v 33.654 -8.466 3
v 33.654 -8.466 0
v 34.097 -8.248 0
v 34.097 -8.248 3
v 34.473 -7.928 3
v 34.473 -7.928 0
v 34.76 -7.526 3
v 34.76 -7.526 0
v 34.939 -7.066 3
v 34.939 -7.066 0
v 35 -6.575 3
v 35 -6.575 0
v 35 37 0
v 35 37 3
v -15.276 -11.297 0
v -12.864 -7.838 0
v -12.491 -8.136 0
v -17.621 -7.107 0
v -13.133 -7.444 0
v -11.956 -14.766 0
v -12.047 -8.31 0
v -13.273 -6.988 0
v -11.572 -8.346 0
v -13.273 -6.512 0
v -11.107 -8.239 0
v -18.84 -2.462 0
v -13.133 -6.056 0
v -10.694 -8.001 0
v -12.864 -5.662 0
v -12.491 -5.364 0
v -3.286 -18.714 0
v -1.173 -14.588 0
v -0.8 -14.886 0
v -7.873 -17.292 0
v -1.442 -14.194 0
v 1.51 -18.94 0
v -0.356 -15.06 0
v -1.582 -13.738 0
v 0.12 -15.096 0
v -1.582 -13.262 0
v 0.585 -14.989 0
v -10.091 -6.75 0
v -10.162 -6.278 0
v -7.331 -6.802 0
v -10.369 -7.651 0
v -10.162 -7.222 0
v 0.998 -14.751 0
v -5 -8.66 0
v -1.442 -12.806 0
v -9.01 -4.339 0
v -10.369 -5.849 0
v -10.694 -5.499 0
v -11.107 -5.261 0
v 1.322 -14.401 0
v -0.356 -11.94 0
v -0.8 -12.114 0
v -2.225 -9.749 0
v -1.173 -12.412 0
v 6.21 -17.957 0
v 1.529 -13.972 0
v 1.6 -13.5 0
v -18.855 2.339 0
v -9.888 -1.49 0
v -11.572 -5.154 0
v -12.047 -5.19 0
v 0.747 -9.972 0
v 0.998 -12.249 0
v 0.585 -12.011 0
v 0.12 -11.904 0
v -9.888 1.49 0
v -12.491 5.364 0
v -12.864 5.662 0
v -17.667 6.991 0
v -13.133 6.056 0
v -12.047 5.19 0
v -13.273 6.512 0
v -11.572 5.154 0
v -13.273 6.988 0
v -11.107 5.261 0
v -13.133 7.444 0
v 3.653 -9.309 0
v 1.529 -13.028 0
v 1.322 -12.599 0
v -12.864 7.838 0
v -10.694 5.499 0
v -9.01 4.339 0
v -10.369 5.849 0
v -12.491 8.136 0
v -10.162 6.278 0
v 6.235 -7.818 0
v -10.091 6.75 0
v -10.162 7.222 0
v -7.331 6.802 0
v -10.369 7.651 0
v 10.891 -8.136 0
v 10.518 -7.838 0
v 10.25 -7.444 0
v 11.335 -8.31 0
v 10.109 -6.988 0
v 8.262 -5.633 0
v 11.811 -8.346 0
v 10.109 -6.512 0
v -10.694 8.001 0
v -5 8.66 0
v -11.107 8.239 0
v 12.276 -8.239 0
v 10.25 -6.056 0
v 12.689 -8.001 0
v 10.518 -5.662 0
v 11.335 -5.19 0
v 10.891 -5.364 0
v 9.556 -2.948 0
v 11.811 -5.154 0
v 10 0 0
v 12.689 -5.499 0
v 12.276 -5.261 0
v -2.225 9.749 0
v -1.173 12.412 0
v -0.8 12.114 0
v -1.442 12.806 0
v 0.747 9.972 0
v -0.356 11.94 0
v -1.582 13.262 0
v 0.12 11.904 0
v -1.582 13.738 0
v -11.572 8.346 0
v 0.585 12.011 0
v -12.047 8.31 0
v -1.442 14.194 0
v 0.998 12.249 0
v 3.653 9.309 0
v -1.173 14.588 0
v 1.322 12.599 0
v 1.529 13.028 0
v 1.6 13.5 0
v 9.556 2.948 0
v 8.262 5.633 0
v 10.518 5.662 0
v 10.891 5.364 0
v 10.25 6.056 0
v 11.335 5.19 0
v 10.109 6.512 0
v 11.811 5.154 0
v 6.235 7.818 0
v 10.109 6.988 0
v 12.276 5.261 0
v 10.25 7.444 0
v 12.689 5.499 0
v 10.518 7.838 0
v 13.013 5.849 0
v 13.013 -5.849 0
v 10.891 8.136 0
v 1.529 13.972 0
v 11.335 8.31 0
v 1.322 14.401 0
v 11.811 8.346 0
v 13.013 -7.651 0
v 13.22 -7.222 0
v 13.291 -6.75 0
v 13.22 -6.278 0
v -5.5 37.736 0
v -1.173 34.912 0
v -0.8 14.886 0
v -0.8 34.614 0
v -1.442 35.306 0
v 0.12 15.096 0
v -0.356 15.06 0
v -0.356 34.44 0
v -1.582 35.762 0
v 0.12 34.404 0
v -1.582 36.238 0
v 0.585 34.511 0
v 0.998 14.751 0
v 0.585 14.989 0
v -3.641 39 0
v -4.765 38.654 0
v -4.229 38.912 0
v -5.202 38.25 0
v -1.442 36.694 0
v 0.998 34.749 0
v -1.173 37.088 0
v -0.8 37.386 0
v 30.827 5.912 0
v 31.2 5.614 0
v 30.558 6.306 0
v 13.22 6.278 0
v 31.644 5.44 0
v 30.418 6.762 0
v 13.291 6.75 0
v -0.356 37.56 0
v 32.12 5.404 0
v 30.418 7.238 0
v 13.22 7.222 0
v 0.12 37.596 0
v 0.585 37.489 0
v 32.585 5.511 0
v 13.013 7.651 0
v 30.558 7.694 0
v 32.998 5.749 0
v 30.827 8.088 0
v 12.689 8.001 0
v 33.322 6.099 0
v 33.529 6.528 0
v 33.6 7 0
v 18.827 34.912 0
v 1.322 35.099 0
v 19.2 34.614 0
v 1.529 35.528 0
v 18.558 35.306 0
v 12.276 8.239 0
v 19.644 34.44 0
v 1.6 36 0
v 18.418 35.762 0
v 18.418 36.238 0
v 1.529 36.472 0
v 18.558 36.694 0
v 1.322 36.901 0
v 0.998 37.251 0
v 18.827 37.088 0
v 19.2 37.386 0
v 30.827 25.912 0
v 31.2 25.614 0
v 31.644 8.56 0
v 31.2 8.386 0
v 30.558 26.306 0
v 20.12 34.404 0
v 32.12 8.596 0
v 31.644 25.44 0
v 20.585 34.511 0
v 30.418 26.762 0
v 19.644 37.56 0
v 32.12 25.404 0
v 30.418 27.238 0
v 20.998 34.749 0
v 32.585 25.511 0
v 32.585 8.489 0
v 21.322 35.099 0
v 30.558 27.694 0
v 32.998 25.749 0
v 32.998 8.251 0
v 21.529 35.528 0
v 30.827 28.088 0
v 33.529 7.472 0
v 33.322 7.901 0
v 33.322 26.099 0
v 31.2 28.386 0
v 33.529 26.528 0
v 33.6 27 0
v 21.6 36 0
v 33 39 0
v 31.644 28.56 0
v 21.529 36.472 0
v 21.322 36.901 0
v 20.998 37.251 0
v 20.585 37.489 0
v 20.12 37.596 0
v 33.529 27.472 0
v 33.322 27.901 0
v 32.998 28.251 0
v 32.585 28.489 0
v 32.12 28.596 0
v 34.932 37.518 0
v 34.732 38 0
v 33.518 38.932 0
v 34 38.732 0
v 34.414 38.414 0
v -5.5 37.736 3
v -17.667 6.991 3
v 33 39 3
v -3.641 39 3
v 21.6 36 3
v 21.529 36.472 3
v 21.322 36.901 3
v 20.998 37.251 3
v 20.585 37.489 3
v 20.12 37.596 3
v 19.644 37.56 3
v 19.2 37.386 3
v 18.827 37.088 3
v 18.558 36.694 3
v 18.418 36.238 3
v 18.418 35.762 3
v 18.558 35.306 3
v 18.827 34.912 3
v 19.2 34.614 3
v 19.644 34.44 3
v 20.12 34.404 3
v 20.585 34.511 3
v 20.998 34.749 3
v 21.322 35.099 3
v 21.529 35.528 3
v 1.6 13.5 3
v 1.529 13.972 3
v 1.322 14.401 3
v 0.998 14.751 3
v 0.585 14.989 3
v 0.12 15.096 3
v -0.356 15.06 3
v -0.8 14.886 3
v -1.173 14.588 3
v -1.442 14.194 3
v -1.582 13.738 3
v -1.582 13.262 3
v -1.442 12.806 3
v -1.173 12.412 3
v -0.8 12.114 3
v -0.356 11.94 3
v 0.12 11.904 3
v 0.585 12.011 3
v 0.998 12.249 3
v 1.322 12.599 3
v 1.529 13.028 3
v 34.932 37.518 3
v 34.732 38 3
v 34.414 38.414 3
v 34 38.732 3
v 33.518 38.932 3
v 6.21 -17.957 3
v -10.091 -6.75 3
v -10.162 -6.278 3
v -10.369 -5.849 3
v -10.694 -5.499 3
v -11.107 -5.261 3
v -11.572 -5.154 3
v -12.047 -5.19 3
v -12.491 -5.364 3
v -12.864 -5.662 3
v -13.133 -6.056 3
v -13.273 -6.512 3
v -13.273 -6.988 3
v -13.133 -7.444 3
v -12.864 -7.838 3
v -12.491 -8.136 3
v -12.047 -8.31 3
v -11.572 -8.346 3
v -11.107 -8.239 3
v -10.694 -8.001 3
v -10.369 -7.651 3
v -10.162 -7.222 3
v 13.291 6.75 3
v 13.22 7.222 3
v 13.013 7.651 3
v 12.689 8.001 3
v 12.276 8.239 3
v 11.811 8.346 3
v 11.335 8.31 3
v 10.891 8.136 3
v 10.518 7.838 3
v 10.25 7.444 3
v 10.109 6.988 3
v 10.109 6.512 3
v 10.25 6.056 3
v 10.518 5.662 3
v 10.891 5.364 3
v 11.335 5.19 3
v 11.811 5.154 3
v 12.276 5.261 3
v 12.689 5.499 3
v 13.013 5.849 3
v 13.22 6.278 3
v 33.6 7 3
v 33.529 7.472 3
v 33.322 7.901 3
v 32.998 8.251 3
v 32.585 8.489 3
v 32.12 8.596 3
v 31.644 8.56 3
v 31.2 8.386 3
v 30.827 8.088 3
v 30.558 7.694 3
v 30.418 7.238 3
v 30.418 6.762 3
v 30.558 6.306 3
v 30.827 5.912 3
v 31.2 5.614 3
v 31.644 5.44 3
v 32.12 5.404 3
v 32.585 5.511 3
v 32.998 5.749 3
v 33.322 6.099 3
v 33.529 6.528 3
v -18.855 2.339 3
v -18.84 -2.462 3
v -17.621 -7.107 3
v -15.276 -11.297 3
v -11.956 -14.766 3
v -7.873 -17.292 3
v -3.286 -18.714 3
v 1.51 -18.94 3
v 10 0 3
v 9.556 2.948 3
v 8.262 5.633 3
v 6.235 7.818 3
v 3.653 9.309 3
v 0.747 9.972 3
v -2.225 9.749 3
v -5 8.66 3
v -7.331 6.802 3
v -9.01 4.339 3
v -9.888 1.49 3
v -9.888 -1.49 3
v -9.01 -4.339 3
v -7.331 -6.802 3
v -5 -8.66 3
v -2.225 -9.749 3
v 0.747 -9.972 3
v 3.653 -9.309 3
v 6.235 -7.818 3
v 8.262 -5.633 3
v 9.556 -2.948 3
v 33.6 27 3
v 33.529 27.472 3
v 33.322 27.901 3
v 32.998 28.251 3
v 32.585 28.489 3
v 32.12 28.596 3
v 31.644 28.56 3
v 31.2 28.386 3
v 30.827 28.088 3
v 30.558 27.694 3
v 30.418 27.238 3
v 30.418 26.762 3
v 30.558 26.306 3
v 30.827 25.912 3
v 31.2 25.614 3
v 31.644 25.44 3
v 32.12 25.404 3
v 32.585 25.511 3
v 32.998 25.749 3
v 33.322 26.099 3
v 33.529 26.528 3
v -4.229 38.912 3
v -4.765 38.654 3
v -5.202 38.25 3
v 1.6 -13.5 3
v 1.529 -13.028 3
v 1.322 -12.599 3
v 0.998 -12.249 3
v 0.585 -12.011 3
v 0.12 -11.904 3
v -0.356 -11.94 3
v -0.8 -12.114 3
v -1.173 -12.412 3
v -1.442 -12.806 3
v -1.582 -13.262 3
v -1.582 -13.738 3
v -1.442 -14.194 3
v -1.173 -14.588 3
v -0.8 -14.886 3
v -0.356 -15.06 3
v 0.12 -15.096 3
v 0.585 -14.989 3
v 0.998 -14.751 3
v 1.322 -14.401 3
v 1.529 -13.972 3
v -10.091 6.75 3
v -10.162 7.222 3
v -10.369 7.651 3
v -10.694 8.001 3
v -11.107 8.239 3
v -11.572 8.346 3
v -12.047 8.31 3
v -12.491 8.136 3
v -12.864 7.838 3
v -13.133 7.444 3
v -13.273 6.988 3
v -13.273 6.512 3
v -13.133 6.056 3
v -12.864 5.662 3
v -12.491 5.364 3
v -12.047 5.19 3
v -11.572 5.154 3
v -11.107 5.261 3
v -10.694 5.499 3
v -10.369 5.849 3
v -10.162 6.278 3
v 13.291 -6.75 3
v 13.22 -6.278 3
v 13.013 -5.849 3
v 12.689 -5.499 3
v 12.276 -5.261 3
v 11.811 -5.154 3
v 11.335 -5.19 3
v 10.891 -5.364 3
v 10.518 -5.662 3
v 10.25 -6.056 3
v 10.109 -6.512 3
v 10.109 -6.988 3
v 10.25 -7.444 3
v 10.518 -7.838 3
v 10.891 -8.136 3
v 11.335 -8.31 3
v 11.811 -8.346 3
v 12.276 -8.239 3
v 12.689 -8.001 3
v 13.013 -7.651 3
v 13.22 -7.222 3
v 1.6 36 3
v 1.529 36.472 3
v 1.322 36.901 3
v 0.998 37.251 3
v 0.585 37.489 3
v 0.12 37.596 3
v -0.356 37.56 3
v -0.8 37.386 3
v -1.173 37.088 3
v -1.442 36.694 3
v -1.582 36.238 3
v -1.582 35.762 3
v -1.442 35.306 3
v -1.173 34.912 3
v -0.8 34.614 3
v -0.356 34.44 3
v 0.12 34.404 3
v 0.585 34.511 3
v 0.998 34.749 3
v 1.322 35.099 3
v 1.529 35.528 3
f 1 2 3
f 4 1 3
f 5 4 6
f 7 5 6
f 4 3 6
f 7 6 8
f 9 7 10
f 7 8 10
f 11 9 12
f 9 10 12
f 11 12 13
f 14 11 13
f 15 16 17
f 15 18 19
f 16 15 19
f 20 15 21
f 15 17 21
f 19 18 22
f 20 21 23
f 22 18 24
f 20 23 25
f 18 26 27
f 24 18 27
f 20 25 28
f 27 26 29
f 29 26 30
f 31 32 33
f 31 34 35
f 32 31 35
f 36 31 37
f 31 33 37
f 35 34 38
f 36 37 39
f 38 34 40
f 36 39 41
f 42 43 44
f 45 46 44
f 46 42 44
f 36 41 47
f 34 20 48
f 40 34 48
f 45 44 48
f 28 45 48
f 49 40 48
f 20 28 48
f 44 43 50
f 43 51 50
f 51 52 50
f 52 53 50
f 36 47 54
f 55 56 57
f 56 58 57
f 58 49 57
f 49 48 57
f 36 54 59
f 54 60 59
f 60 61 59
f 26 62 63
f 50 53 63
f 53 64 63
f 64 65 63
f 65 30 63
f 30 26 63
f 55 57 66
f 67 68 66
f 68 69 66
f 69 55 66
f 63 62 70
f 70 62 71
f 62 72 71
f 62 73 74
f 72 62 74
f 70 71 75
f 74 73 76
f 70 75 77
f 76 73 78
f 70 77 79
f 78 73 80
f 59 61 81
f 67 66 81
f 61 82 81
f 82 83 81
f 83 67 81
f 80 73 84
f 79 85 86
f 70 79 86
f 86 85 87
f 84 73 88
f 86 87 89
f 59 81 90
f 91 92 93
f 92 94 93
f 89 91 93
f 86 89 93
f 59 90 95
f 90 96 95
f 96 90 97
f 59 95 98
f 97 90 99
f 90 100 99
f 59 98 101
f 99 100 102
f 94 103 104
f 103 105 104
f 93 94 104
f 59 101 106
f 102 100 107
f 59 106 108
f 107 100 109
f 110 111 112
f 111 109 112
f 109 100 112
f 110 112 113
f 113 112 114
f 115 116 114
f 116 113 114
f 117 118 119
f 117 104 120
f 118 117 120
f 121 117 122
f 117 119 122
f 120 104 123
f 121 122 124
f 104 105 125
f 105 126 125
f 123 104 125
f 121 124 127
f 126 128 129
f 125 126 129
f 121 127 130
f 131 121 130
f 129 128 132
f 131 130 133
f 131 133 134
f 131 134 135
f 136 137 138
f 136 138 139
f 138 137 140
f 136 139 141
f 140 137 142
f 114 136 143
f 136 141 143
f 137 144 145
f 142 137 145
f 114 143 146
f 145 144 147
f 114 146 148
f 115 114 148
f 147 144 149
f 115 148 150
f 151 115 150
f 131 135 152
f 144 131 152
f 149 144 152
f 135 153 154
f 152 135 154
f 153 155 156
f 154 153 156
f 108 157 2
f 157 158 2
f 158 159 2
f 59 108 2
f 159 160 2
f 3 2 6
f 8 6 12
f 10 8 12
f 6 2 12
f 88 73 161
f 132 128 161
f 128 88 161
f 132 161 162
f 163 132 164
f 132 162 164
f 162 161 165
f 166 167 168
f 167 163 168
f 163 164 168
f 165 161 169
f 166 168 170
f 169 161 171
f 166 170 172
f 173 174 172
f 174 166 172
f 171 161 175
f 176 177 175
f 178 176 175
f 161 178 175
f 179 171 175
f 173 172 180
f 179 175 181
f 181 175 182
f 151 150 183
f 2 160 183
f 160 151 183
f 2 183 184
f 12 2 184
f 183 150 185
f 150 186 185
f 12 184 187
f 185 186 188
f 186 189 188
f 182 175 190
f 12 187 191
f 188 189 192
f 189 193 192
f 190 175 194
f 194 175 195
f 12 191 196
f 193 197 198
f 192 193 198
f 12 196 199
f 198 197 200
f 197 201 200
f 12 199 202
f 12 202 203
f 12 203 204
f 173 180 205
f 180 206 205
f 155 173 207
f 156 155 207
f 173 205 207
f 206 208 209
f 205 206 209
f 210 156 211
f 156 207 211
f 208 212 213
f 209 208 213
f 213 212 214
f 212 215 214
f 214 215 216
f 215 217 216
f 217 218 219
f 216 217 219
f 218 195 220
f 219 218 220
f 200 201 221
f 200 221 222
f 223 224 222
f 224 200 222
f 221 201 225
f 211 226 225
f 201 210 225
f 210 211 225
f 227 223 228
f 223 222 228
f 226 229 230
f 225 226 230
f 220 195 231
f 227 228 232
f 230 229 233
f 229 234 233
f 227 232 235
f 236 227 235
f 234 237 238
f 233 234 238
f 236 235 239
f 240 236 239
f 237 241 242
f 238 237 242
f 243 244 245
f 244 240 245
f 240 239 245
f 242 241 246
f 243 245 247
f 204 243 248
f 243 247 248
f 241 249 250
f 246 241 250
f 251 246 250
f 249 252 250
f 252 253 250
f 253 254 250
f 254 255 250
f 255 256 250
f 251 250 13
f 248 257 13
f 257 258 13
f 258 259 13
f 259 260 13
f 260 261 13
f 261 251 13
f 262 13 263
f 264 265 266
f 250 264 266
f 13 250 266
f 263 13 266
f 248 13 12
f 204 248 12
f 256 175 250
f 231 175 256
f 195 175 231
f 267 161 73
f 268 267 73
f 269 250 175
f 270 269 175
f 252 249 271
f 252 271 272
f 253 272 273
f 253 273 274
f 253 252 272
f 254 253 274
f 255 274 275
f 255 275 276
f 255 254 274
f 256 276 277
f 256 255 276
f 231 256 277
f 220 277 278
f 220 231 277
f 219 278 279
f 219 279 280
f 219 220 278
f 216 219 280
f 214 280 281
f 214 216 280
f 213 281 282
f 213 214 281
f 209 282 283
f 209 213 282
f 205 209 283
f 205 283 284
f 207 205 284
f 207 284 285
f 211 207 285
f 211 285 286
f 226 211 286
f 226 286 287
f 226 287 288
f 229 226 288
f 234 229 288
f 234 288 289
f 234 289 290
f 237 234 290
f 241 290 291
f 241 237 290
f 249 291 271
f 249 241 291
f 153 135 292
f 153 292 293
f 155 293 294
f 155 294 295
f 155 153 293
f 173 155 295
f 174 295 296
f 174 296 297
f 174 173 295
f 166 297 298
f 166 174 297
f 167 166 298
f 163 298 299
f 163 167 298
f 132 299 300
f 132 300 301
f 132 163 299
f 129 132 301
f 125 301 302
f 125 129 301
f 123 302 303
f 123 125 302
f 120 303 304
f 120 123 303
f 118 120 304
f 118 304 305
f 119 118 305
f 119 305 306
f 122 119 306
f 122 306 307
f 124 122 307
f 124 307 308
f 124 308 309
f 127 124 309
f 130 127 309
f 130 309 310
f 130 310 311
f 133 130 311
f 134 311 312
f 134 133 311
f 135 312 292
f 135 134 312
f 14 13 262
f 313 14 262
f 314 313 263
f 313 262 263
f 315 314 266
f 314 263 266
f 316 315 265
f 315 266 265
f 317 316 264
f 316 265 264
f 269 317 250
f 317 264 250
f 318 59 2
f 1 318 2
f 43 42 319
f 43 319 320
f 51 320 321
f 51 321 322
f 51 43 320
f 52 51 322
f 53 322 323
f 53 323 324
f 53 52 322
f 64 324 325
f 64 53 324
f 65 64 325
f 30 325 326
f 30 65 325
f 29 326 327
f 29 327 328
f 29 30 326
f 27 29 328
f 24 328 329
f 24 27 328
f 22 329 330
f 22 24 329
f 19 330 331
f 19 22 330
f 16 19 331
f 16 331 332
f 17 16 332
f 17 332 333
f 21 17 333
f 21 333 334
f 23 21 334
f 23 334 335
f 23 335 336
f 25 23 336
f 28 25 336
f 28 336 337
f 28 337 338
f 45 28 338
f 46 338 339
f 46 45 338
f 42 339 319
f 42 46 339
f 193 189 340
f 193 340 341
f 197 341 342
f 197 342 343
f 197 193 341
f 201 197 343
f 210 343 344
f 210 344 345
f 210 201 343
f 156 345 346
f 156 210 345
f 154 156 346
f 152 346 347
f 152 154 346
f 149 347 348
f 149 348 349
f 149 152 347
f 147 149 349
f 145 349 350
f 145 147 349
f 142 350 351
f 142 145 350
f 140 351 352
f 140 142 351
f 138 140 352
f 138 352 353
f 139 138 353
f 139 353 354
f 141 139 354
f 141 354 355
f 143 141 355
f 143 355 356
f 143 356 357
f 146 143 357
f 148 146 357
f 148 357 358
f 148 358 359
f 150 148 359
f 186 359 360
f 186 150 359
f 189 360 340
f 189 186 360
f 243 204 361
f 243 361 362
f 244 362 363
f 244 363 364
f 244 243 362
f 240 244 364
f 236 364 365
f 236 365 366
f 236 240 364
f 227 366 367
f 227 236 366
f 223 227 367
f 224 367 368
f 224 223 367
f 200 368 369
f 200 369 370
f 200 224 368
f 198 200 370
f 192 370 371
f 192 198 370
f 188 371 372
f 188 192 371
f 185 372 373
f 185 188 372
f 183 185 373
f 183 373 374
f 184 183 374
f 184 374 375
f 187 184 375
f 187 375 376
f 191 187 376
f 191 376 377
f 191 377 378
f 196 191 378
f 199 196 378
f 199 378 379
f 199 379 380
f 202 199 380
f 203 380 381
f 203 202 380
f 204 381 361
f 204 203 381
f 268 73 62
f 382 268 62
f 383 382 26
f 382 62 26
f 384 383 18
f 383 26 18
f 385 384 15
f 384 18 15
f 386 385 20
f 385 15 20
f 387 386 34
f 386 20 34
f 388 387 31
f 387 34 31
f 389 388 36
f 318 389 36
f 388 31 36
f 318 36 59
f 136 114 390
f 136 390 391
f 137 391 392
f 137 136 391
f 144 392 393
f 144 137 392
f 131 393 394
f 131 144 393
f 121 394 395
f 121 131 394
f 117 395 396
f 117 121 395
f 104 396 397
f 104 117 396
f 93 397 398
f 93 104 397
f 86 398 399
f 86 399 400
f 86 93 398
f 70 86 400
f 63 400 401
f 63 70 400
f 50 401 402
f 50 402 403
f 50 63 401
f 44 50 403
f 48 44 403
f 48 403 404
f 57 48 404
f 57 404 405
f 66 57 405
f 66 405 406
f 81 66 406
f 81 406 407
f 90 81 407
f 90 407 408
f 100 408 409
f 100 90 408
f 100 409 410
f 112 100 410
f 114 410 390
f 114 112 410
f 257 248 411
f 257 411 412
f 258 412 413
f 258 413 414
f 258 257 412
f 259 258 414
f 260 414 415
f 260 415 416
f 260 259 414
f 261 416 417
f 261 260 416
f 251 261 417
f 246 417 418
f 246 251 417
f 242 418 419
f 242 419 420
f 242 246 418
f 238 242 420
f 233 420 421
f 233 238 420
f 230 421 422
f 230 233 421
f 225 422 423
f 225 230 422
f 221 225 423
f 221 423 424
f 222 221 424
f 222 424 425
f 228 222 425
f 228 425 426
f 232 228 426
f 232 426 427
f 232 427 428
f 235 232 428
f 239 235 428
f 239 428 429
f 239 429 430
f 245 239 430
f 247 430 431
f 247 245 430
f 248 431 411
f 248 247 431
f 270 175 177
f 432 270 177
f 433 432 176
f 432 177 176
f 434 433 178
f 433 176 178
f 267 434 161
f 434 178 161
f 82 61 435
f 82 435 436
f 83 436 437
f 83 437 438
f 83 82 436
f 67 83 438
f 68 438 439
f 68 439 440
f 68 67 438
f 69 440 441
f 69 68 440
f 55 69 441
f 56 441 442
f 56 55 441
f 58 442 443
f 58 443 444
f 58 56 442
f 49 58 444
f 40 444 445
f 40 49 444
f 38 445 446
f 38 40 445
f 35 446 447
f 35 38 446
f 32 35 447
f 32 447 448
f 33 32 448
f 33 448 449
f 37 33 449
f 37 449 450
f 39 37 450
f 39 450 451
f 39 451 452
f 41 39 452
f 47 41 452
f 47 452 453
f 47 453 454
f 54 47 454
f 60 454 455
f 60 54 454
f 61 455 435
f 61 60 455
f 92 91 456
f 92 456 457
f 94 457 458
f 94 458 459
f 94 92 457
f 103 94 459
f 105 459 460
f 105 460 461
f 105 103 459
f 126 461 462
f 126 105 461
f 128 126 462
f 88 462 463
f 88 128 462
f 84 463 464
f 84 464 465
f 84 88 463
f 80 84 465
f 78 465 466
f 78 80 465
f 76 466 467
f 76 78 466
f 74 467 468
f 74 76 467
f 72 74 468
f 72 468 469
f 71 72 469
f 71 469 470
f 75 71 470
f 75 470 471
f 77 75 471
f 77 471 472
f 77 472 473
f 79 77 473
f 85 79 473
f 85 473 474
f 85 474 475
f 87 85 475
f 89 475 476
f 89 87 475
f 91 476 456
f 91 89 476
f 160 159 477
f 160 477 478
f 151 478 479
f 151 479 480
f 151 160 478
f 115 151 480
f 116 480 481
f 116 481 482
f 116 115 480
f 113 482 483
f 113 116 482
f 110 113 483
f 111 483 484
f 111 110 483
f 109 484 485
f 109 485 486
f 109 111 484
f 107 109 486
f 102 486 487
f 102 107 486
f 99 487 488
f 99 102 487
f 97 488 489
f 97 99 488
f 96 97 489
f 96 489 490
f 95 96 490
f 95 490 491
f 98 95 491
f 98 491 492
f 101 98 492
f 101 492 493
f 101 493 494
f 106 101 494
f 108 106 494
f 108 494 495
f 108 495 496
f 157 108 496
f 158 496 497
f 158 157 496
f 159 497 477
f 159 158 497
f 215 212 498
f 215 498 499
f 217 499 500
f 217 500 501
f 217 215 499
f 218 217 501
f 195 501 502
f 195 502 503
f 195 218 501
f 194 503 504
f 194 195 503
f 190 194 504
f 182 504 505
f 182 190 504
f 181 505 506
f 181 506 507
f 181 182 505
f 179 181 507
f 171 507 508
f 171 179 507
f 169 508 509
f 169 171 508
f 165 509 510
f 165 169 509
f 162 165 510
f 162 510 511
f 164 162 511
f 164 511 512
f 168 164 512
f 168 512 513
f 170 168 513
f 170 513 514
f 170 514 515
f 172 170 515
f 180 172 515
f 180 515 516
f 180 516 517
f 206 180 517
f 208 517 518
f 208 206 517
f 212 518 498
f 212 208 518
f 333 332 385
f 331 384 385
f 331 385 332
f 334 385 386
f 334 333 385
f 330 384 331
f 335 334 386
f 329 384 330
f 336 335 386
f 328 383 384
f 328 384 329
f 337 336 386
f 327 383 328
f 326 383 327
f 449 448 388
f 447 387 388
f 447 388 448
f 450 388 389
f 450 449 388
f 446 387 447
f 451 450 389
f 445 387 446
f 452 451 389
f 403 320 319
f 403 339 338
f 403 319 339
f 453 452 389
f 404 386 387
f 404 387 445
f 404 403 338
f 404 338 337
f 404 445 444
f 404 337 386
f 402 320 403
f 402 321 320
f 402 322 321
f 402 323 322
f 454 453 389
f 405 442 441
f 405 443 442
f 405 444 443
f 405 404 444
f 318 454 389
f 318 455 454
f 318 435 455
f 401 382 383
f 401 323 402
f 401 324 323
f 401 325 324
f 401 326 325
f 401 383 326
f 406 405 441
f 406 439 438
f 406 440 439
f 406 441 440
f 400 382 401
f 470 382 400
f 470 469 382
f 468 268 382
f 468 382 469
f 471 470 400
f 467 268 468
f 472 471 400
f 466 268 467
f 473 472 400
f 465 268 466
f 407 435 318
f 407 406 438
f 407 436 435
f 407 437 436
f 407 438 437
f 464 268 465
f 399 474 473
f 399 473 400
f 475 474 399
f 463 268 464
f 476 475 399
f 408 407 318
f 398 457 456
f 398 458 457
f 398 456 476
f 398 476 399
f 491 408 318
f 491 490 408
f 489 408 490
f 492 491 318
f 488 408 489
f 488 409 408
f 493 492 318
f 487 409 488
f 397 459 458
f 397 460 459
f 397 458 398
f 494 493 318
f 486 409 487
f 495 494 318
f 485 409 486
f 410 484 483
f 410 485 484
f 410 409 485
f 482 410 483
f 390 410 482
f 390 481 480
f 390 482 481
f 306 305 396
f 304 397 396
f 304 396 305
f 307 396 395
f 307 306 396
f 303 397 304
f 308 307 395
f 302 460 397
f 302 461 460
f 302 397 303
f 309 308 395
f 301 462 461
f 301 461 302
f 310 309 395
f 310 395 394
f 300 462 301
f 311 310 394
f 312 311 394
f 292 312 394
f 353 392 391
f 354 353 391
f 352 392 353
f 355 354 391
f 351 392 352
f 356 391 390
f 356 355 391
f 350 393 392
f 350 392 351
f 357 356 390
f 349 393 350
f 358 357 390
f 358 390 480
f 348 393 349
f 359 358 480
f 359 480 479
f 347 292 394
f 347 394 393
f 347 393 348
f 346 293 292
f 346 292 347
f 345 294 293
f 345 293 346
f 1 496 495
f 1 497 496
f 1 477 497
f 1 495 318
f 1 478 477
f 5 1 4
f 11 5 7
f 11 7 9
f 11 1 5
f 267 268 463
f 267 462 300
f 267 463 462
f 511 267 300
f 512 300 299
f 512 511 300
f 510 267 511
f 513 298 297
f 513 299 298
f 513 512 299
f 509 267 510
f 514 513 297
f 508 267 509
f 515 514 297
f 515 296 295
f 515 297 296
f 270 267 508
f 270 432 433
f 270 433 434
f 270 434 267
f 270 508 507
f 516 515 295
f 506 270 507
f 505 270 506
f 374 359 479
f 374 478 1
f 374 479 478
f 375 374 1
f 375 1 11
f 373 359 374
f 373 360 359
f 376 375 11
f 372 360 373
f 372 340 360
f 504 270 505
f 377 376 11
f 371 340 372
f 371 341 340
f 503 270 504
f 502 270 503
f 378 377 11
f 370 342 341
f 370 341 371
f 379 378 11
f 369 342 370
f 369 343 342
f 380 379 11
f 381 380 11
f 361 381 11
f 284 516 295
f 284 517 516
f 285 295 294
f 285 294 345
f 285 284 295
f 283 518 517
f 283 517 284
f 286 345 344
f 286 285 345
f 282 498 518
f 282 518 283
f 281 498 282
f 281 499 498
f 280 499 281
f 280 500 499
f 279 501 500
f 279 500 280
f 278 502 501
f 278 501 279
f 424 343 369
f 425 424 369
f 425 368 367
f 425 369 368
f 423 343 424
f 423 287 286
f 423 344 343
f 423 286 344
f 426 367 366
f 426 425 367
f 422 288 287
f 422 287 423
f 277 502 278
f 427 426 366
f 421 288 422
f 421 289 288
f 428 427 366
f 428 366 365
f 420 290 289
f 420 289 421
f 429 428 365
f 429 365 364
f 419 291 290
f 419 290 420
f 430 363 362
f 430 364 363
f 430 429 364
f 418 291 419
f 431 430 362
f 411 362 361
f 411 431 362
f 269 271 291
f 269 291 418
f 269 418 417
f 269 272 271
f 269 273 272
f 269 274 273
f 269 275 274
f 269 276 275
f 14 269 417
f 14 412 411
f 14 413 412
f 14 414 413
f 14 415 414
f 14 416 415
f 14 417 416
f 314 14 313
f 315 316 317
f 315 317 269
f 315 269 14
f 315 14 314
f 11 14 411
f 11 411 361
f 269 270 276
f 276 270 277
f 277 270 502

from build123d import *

# Parameters (mm, degrees)
SKETCH_1_R      = 19
SKETCH_1_R_2    = 10
SKETCH_1_R_3    = 1.6
EXTRUDE_1_DEPTH = 3
EXTRUDE_START   = -3
SKETCH_2_R      = 1.6
EXTRUDE_3_DEPTH = 3


with BuildPart() as part:
    # 草图1 → 凸台-拉伸1 (new body)
    with BuildSketch(Plane.XY):
        Circle(SKETCH_1_R)
        Circle(SKETCH_1_R_2, mode=Mode.SUBTRACT)
        with Locations((0, 13.5)):
            Circle(SKETCH_1_R_3, mode=Mode.SUBTRACT)
        with Locations((11.691342951, 6.75)):
            Circle(SKETCH_1_R_3, mode=Mode.SUBTRACT)
        with Locations((11.691342951, -6.75)):
            Circle(SKETCH_1_R_3, mode=Mode.SUBTRACT)
        with Locations((0, -13.5)):
            Circle(SKETCH_1_R_3, mode=Mode.SUBTRACT)
        with Locations((-11.691342951, -6.75)):
            Circle(SKETCH_1_R_3, mode=Mode.SUBTRACT)
        with Locations((-11.691342951, 6.75)):
            Circle(SKETCH_1_R_3, mode=Mode.SUBTRACT)
    extrude(amount=EXTRUDE_1_DEPTH)

    # 草图2 → 凸台-拉伸3 (add)
    with BuildSketch(Plane.XY.offset(3).offset(EXTRUDE_START)):
        with BuildLine():
            Line((35, -6.575441021), (35, 37))
            ThreePointArc((35, 37), (34.414213562, 38.414213562), (33, 39))
            Line((33, 39), (-3.640557622, 39))
            ThreePointArc((-3.640557622, 39), (-4.764862291, 38.654067414), (-5.500233339, 37.735939011))
            Line((-5.500233339, 37.735939011), (-17.666919312, 6.991420601))
            ThreePointArc((-17.666919312, 6.991420601), (13.726454821, 13.137139645), (6.209937899, -17.956521692))
            Line((6.209937899, -17.956521692), (33.653677674, -8.4656012))
            ThreePointArc((33.653677674, -8.4656012), (34.629011256, -7.735752327), (35, -6.575441021))
        make_face()
        with Locations((32, 7)):
            Circle(SKETCH_2_R, mode=Mode.SUBTRACT)
        with Locations((32, 27)):
            Circle(SKETCH_2_R, mode=Mode.SUBTRACT)
        with Locations((0, 36)):
            Circle(SKETCH_2_R, mode=Mode.SUBTRACT)
        with Locations((20, 36)):
            Circle(SKETCH_2_R, mode=Mode.SUBTRACT)
    extrude(amount=EXTRUDE_3_DEPTH)


solid = part.part
